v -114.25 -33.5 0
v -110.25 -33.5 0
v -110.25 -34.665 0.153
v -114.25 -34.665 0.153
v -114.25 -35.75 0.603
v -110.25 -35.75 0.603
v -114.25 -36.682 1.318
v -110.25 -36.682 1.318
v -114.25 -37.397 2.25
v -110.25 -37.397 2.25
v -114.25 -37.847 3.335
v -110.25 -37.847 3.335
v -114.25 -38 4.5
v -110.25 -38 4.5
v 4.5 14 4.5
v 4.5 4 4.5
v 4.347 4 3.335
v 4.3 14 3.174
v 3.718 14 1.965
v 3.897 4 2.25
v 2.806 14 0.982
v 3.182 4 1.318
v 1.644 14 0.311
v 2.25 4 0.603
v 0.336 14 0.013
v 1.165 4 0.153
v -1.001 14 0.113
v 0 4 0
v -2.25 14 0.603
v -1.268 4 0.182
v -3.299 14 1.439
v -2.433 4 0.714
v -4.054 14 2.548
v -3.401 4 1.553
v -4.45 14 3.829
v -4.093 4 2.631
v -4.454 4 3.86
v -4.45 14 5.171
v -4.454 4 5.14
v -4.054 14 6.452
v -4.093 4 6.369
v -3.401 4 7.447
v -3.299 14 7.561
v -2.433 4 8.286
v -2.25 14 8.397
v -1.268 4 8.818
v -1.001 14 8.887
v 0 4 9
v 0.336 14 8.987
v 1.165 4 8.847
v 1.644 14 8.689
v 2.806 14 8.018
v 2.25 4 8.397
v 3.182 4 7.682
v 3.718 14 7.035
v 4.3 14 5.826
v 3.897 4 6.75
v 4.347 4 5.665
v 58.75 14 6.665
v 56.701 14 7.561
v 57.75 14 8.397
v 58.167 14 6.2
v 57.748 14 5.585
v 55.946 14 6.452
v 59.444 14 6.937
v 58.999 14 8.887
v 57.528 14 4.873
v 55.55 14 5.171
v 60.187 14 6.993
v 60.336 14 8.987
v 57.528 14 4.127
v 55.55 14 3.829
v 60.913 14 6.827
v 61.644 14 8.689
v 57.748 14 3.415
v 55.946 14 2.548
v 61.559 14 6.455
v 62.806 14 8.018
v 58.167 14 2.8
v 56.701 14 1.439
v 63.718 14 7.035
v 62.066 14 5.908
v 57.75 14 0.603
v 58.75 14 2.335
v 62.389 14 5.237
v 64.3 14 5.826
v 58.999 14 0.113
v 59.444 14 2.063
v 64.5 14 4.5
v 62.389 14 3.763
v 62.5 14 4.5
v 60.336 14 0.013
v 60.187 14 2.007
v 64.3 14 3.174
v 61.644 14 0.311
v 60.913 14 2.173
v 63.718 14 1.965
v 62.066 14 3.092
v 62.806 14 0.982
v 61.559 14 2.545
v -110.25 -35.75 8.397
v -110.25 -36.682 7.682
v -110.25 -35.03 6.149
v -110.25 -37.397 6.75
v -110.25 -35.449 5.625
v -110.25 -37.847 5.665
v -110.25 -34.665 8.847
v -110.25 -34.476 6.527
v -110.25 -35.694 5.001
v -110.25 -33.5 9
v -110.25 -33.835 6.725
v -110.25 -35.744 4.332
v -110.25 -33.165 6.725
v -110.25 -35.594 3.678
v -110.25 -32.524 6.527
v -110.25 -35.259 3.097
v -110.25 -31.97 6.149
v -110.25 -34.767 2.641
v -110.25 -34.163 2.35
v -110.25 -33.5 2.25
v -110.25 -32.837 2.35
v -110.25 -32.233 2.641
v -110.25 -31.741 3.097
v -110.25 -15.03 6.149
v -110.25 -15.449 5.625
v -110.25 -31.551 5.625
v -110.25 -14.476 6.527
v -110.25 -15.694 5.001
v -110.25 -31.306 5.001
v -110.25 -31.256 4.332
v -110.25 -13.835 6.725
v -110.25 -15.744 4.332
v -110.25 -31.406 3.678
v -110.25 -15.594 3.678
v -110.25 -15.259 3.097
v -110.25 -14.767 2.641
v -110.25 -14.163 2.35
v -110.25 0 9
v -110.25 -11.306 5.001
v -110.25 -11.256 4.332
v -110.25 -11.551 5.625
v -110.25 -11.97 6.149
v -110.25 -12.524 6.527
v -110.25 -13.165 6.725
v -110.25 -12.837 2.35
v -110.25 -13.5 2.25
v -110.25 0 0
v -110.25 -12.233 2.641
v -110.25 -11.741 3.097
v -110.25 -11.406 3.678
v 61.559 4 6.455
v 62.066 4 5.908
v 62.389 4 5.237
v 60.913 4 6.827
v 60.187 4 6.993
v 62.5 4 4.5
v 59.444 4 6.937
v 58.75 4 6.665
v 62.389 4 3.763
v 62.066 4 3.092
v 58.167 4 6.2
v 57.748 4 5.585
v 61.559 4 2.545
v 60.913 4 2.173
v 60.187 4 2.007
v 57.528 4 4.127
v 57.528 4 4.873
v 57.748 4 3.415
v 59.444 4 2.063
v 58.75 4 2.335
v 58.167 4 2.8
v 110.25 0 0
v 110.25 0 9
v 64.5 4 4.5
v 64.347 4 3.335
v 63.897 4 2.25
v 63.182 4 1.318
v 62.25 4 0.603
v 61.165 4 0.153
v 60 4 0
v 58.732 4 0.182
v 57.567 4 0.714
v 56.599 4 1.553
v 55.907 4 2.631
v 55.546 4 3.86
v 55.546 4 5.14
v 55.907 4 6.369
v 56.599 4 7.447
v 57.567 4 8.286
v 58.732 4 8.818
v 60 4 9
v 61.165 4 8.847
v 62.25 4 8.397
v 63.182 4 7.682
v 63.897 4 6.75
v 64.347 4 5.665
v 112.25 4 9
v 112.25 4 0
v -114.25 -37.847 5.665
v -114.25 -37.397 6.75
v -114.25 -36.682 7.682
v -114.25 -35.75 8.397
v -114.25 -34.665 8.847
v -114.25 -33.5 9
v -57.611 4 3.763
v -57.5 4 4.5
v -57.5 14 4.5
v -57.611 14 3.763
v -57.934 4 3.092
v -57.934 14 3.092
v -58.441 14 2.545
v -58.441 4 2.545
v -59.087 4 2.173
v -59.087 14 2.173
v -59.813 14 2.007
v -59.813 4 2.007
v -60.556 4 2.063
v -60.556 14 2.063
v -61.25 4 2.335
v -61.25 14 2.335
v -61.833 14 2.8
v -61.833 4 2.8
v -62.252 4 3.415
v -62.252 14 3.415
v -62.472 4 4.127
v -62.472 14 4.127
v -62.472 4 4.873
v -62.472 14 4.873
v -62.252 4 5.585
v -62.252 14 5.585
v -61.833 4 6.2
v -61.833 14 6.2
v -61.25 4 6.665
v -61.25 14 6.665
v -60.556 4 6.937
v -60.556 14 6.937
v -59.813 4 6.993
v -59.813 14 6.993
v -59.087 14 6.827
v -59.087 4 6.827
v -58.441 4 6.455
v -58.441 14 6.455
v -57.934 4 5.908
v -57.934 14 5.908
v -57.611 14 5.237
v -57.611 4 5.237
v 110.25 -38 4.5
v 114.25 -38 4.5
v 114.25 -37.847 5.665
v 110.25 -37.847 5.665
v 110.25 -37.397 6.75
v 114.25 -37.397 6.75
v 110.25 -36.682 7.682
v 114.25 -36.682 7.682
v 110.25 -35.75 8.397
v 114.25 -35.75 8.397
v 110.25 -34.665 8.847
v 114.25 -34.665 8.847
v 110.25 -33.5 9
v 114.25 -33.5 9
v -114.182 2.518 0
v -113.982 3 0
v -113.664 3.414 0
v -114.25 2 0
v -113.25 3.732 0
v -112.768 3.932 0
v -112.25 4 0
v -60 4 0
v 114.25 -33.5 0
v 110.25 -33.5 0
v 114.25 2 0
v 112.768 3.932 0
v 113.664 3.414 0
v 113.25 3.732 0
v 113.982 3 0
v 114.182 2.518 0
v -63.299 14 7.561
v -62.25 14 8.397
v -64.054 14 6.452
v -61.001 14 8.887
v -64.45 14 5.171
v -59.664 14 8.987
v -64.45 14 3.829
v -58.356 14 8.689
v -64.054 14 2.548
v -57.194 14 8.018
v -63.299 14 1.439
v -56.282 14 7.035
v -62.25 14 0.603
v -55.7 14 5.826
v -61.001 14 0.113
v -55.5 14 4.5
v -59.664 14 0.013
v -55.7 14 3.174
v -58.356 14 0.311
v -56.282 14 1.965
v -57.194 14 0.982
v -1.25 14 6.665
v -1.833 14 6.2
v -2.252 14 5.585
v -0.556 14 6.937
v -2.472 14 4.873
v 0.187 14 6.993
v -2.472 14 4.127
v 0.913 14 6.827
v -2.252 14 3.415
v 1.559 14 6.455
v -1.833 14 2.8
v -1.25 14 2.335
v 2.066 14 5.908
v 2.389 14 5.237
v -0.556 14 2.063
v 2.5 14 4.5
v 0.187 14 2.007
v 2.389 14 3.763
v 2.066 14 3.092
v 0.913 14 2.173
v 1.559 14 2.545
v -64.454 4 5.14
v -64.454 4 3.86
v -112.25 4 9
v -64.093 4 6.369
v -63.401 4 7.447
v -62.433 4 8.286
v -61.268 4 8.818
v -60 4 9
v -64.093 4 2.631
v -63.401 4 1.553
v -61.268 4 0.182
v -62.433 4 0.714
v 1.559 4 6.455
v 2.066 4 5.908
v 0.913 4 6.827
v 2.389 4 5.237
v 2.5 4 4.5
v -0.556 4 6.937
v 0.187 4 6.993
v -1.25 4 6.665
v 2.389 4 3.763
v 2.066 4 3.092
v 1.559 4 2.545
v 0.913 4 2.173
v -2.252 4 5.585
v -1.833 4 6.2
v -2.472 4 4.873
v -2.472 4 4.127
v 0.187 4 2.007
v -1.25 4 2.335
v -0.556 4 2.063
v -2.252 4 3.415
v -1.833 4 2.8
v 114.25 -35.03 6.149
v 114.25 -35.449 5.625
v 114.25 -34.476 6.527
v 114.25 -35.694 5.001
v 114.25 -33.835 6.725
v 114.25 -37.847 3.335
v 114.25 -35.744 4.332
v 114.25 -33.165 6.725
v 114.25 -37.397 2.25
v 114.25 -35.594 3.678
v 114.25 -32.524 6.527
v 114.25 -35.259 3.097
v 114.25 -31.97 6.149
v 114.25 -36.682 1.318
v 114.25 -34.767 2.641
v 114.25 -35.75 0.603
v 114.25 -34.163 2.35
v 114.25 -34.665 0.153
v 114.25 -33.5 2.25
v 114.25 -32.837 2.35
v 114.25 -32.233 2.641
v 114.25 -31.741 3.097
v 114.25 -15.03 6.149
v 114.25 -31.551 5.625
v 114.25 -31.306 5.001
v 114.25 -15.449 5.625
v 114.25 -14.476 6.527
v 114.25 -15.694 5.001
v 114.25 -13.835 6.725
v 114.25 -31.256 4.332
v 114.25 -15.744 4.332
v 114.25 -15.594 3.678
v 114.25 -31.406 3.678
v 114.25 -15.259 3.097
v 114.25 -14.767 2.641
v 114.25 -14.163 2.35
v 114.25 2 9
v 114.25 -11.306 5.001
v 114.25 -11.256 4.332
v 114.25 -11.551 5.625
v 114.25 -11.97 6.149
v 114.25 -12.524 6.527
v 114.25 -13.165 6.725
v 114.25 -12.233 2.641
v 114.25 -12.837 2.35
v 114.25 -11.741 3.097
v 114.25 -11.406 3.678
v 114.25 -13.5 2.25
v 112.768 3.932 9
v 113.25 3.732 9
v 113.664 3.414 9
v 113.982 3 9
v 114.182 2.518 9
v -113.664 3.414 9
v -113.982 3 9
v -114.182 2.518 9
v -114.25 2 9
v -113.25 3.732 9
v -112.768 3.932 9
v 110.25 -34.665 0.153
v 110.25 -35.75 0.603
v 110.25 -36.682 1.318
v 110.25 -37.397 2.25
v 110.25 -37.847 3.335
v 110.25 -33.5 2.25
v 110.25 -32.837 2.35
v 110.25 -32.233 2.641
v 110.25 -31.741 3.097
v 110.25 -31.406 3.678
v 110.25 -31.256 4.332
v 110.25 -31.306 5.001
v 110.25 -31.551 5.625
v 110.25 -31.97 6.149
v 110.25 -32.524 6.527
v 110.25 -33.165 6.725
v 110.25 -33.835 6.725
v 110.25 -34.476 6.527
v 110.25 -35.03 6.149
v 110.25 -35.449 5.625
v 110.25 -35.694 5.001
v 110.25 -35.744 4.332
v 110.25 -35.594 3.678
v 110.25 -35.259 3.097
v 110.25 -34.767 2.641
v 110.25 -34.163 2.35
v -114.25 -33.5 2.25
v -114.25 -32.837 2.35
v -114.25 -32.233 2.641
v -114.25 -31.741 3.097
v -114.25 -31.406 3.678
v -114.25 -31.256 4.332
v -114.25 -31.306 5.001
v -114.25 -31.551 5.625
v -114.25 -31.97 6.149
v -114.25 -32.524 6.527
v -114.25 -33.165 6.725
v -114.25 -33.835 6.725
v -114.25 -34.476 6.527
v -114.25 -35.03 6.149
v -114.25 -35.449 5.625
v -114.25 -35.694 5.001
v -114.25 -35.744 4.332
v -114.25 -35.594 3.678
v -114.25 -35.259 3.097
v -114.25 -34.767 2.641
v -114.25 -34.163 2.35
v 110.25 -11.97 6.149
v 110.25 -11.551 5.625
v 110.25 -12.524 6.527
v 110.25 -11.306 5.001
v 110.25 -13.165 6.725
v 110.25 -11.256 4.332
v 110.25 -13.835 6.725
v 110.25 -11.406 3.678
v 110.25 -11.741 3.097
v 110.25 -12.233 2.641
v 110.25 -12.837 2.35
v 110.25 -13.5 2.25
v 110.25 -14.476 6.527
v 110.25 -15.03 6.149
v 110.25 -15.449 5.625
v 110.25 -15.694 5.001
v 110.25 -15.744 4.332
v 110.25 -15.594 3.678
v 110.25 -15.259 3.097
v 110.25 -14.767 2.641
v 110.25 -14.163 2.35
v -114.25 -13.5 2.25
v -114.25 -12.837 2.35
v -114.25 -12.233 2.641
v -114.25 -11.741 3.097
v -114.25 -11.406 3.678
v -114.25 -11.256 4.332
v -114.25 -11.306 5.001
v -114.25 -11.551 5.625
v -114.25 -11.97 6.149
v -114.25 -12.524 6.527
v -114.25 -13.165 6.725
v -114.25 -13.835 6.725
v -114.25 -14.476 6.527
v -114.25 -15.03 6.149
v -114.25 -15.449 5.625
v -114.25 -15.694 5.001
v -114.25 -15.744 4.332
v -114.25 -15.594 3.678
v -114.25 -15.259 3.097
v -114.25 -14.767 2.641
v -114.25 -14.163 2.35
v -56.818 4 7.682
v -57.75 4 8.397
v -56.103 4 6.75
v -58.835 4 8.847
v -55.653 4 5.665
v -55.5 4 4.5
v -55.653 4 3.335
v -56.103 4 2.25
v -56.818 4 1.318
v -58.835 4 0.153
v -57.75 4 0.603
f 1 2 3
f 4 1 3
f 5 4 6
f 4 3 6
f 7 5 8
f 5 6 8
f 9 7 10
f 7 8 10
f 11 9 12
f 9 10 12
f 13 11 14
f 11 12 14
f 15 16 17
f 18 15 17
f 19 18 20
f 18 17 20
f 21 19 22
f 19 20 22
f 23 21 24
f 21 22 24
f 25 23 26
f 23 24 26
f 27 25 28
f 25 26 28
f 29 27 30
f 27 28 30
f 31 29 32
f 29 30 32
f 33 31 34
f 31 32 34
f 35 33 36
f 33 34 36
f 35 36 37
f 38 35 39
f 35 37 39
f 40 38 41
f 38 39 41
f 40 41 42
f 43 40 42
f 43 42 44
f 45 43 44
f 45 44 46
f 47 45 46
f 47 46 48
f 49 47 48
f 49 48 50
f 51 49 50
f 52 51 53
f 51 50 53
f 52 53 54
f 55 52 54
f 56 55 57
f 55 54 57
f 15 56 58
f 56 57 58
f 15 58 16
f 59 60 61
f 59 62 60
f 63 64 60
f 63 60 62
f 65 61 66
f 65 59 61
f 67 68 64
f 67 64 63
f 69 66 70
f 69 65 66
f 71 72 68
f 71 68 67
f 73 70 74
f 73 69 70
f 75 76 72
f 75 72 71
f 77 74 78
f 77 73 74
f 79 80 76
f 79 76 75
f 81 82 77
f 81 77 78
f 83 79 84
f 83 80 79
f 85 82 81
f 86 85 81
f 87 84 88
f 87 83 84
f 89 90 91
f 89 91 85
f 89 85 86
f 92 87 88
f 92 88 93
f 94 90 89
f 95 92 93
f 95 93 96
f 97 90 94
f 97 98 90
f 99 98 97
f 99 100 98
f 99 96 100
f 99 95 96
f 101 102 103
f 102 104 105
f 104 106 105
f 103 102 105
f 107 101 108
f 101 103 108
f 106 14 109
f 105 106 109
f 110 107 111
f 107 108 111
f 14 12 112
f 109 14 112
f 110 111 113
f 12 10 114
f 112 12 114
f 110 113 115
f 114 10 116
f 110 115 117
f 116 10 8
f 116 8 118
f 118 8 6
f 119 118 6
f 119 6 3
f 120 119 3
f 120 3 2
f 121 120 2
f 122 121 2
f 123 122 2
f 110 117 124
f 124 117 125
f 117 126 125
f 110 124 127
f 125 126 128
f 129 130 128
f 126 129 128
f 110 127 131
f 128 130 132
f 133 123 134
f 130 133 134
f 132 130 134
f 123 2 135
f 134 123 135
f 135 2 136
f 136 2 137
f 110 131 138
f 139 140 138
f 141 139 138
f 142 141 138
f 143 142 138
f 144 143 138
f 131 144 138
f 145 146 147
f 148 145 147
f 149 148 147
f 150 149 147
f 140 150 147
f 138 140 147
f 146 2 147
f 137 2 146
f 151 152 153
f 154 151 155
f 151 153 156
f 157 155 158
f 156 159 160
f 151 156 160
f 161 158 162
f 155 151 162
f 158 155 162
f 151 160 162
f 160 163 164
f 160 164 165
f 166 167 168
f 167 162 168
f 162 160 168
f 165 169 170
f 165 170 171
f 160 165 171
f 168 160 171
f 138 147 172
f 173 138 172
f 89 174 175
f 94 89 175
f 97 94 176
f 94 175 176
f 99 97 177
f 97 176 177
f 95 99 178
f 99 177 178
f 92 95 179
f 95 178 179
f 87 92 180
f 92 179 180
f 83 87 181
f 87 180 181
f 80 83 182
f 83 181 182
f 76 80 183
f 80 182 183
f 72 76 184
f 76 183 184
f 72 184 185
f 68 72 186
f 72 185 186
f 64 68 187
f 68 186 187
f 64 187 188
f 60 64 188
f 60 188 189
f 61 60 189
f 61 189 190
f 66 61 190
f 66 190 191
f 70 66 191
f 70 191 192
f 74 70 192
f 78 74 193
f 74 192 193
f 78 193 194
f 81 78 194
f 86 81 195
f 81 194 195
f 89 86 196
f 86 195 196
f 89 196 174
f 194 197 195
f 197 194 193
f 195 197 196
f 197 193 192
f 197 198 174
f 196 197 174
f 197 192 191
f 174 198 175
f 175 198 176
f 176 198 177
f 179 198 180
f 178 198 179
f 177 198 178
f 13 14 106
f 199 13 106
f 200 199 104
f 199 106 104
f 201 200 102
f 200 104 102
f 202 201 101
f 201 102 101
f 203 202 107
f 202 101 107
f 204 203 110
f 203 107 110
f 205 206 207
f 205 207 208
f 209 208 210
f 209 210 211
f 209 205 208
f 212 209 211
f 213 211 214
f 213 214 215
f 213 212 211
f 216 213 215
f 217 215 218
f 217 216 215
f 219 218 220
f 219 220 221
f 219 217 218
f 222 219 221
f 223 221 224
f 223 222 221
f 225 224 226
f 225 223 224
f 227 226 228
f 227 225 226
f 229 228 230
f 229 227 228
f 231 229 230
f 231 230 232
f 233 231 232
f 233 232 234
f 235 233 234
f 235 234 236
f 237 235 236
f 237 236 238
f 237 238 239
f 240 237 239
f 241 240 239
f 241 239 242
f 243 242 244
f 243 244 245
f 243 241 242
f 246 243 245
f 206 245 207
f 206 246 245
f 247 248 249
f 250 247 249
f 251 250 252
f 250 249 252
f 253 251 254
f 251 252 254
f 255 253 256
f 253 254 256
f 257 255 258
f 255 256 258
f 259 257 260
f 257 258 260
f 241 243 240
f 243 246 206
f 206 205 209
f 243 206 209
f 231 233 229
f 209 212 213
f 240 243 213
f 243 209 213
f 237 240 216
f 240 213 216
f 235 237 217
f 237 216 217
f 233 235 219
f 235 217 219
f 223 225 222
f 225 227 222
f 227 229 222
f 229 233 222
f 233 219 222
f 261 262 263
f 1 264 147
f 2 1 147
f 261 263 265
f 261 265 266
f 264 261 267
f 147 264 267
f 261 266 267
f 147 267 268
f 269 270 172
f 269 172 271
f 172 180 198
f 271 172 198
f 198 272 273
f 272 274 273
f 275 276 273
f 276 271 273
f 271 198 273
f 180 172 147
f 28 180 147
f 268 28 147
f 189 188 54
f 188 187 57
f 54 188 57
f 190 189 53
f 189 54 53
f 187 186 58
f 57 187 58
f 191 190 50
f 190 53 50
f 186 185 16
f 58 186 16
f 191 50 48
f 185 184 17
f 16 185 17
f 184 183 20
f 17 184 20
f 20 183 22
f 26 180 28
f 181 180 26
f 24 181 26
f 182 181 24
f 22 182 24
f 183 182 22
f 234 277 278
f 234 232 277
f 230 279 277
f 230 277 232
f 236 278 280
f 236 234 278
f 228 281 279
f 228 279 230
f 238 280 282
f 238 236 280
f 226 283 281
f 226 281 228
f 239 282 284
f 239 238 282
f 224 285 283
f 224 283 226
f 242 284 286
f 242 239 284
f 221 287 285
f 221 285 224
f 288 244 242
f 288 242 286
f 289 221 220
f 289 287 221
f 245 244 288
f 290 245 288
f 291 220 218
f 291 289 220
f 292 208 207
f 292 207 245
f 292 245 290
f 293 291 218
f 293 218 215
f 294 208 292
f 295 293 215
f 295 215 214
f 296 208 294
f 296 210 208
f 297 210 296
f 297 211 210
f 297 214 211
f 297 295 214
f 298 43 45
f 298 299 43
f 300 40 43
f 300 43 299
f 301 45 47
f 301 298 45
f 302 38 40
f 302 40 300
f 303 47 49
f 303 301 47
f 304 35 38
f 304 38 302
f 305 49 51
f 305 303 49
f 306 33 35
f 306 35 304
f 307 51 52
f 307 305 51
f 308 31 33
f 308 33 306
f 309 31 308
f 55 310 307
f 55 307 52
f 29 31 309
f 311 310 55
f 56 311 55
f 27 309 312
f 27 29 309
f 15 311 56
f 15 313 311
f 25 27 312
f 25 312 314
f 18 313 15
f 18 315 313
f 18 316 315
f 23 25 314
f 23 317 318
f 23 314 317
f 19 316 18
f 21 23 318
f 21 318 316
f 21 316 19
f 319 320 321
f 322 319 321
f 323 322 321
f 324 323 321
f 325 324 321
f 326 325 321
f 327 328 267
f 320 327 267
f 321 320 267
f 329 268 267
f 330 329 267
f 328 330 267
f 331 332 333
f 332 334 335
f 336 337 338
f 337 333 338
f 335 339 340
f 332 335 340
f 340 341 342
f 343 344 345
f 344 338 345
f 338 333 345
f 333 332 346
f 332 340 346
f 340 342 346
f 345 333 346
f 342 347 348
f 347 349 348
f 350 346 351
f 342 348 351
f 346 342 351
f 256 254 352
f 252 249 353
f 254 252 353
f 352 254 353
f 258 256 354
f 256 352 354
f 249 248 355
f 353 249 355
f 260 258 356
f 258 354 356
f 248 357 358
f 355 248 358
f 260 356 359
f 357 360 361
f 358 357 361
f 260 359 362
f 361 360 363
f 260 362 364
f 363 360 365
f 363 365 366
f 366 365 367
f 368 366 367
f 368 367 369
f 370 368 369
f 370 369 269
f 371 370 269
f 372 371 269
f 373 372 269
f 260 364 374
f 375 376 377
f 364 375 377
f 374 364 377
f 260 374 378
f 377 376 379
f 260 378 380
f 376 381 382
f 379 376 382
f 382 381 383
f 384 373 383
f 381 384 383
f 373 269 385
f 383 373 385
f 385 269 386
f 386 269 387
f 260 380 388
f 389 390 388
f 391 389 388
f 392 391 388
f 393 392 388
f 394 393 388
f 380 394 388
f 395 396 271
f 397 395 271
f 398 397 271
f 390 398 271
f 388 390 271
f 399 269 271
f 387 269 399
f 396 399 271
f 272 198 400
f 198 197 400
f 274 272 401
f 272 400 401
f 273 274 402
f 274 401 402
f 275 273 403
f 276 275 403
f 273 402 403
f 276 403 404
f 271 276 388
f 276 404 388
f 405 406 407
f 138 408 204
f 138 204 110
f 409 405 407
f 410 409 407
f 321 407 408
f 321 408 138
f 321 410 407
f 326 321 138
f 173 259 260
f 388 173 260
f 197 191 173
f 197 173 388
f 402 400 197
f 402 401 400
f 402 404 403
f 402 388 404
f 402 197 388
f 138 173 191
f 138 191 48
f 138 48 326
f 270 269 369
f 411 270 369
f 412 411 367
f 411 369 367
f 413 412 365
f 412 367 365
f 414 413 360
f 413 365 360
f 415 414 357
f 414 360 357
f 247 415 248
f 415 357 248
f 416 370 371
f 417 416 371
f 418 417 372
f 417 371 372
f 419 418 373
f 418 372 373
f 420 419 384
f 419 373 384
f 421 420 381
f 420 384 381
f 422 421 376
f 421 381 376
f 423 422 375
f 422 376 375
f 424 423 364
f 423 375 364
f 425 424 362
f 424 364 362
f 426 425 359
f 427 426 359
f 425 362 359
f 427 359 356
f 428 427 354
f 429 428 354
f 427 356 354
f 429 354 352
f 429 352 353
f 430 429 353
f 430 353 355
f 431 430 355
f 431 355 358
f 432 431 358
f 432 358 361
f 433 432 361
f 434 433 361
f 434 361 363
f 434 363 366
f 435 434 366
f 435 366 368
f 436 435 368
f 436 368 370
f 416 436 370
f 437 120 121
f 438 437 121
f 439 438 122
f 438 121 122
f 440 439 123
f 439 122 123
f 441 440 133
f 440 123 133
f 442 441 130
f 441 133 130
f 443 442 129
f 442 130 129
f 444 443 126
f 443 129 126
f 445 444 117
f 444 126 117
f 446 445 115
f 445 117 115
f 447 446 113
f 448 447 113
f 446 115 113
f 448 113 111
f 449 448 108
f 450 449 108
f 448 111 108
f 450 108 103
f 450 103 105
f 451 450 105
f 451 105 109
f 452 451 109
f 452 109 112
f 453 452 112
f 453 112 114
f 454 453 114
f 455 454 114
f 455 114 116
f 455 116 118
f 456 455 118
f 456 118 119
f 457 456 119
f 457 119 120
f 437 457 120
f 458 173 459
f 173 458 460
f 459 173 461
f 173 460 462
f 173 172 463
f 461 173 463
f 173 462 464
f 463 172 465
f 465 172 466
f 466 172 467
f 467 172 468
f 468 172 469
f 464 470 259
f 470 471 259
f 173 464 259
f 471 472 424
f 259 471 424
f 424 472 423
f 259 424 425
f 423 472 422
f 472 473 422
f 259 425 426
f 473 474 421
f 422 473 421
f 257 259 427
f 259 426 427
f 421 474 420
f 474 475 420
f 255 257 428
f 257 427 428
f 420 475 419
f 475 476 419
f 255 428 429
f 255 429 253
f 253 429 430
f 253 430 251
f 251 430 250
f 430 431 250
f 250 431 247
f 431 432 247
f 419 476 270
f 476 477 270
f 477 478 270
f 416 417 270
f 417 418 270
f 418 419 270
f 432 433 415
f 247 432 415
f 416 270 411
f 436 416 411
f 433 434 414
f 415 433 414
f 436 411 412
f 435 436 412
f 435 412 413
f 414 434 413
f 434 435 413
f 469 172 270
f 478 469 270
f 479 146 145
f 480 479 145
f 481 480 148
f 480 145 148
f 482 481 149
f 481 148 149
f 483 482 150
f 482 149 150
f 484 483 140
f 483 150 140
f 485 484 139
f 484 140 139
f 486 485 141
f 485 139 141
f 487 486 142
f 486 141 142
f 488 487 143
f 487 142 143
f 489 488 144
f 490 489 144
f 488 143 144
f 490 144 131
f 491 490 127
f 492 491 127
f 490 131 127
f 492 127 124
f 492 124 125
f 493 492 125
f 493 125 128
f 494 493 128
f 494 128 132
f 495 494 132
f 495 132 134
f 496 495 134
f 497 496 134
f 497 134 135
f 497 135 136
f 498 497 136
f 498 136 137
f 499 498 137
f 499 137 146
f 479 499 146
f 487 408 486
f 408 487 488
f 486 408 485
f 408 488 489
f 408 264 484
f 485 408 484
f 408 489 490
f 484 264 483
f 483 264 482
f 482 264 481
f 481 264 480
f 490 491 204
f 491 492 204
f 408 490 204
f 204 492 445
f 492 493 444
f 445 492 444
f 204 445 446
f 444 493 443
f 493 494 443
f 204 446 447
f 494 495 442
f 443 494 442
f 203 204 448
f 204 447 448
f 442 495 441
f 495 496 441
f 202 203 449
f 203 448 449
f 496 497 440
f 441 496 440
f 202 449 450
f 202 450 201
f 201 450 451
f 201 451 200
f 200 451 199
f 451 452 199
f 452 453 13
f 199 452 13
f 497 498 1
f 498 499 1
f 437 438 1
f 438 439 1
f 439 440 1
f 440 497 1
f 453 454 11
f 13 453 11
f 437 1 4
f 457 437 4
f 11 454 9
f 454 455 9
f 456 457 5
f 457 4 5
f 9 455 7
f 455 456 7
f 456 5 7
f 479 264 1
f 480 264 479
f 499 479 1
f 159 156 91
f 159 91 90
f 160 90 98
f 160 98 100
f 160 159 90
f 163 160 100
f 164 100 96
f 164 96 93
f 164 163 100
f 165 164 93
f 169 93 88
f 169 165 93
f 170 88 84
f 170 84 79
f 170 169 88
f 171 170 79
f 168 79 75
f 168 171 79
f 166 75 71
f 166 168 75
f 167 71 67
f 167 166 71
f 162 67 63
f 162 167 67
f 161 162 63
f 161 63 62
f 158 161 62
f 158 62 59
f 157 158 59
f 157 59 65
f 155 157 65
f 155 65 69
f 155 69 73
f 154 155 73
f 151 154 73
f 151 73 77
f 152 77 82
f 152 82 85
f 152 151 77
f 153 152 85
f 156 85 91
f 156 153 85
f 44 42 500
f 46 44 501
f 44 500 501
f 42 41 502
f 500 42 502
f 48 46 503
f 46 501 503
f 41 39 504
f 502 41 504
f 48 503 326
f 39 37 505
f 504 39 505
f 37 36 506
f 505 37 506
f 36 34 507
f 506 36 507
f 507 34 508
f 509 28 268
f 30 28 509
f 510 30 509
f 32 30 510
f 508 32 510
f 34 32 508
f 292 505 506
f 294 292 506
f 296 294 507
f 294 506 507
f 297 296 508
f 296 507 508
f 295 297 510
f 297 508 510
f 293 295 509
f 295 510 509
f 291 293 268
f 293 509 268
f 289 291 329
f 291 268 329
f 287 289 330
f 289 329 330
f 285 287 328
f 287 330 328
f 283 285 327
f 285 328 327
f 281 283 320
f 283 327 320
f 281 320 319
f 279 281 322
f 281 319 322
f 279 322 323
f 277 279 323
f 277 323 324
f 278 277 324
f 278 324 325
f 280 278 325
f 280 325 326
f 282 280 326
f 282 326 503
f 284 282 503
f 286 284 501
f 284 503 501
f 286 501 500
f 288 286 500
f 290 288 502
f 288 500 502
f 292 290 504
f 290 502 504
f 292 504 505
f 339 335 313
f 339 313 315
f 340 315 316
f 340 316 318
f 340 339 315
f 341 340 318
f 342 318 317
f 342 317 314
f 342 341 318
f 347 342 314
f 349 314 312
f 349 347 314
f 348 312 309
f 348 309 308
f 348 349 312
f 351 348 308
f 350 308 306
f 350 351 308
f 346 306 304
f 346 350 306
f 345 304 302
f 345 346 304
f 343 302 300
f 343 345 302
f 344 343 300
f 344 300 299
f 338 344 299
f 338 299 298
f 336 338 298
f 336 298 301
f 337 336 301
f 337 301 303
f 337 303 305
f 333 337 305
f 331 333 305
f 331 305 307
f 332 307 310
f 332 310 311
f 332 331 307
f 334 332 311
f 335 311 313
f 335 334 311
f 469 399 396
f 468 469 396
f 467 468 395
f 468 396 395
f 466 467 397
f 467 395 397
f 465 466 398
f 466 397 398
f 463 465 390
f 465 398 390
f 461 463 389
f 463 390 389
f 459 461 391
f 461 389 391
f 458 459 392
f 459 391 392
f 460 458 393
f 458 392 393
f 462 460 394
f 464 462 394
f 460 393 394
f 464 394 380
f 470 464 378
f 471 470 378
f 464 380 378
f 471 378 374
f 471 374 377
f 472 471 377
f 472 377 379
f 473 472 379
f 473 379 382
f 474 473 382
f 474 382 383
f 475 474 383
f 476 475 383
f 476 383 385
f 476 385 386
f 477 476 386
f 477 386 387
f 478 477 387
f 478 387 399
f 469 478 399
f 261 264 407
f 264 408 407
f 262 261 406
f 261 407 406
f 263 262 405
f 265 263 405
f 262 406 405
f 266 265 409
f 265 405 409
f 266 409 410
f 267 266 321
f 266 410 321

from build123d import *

# Parameters (mm, degrees)
BOSS_EXTRUDE1_DEPTH = 9
SKETCH2_R           = 2.25
CUT_EXTRUDE1_DEPTH  = 229.5
FILLET1_R           = 2
SKETCH3_R           = 4.5
SKETCH3_R_2         = 2.5
BOSS_EXTRUDE2_DEPTH = 10


with BuildPart() as part:
    # Sketch1 → Boss-Extrude1 (new body)
    with BuildSketch(Plane.XY):
        Polygon((-110.25, 0), (110.25, 0), (110.25, -38), (114.25, -38), (114.25, 4), (-114.25, 4), (-114.25, -38), (-110.25, -38), align=None)
    extrude(amount=BOSS_EXTRUDE1_DEPTH)

    # Sketch2 → Cut-Extrude1 (cut, through all)
    with BuildSketch(Plane(origin=(114.25, 0, 0), x_dir=(0, 0, -1), z_dir=(1, 0, 0))):
        with Locations((-4.5, -13.5)):
            Circle(SKETCH2_R)
        with BuildLine():
            ThreePointArc((-4.5, -38), (-7.681980515, -36.681980515), (-9, -33.5))
            Line((-9, -33.5), (-9, -38))
            Line((-9, -38), (-4.5, -38))
        make_face()
        with BuildLine():
            Line((0, -38), (0, -33.5))
            ThreePointArc((0, -33.5), (-1.318019485, -36.681980515), (-4.5, -38))
            Line((-4.5, -38), (0, -38))
        make_face()
        with Locations((-4.5, -33.5)):
            Circle(SKETCH2_R)
    extrude(amount=-CUT_EXTRUDE1_DEPTH, mode=Mode.SUBTRACT)

    # Fillet1
    fillet1_edges = [part.edges().sort_by_distance(p)[0] for p in [
        (114.25, 4, 4.5),
        (-114.25, 4, 4.5),
    ]]
    fillet(fillet1_edges, radius=FILLET1_R)

    # Sketch3 → Boss-Extrude2 (add)
    with BuildSketch(Plane(origin=(0, 4, 0), x_dir=(1, 0, 0), z_dir=(0, 1, 0))):
        with Locations((0, -4.5)):
            Circle(SKETCH3_R)
        with Locations((0, -4.5)):
            Circle(SKETCH3_R_2, mode=Mode.SUBTRACT)
        with Locations((60, -4.5)):
            Circle(SKETCH3_R)
        with Locations((60, -4.5)):
            Circle(SKETCH3_R_2, mode=Mode.SUBTRACT)
        with Locations((-60, -4.5)):
            Circle(SKETCH3_R)
        with Locations((-60, -4.5)):
            Circle(SKETCH3_R_2, mode=Mode.SUBTRACT)
    extrude(amount=BOSS_EXTRUDE2_DEPTH)


solid = part.part
